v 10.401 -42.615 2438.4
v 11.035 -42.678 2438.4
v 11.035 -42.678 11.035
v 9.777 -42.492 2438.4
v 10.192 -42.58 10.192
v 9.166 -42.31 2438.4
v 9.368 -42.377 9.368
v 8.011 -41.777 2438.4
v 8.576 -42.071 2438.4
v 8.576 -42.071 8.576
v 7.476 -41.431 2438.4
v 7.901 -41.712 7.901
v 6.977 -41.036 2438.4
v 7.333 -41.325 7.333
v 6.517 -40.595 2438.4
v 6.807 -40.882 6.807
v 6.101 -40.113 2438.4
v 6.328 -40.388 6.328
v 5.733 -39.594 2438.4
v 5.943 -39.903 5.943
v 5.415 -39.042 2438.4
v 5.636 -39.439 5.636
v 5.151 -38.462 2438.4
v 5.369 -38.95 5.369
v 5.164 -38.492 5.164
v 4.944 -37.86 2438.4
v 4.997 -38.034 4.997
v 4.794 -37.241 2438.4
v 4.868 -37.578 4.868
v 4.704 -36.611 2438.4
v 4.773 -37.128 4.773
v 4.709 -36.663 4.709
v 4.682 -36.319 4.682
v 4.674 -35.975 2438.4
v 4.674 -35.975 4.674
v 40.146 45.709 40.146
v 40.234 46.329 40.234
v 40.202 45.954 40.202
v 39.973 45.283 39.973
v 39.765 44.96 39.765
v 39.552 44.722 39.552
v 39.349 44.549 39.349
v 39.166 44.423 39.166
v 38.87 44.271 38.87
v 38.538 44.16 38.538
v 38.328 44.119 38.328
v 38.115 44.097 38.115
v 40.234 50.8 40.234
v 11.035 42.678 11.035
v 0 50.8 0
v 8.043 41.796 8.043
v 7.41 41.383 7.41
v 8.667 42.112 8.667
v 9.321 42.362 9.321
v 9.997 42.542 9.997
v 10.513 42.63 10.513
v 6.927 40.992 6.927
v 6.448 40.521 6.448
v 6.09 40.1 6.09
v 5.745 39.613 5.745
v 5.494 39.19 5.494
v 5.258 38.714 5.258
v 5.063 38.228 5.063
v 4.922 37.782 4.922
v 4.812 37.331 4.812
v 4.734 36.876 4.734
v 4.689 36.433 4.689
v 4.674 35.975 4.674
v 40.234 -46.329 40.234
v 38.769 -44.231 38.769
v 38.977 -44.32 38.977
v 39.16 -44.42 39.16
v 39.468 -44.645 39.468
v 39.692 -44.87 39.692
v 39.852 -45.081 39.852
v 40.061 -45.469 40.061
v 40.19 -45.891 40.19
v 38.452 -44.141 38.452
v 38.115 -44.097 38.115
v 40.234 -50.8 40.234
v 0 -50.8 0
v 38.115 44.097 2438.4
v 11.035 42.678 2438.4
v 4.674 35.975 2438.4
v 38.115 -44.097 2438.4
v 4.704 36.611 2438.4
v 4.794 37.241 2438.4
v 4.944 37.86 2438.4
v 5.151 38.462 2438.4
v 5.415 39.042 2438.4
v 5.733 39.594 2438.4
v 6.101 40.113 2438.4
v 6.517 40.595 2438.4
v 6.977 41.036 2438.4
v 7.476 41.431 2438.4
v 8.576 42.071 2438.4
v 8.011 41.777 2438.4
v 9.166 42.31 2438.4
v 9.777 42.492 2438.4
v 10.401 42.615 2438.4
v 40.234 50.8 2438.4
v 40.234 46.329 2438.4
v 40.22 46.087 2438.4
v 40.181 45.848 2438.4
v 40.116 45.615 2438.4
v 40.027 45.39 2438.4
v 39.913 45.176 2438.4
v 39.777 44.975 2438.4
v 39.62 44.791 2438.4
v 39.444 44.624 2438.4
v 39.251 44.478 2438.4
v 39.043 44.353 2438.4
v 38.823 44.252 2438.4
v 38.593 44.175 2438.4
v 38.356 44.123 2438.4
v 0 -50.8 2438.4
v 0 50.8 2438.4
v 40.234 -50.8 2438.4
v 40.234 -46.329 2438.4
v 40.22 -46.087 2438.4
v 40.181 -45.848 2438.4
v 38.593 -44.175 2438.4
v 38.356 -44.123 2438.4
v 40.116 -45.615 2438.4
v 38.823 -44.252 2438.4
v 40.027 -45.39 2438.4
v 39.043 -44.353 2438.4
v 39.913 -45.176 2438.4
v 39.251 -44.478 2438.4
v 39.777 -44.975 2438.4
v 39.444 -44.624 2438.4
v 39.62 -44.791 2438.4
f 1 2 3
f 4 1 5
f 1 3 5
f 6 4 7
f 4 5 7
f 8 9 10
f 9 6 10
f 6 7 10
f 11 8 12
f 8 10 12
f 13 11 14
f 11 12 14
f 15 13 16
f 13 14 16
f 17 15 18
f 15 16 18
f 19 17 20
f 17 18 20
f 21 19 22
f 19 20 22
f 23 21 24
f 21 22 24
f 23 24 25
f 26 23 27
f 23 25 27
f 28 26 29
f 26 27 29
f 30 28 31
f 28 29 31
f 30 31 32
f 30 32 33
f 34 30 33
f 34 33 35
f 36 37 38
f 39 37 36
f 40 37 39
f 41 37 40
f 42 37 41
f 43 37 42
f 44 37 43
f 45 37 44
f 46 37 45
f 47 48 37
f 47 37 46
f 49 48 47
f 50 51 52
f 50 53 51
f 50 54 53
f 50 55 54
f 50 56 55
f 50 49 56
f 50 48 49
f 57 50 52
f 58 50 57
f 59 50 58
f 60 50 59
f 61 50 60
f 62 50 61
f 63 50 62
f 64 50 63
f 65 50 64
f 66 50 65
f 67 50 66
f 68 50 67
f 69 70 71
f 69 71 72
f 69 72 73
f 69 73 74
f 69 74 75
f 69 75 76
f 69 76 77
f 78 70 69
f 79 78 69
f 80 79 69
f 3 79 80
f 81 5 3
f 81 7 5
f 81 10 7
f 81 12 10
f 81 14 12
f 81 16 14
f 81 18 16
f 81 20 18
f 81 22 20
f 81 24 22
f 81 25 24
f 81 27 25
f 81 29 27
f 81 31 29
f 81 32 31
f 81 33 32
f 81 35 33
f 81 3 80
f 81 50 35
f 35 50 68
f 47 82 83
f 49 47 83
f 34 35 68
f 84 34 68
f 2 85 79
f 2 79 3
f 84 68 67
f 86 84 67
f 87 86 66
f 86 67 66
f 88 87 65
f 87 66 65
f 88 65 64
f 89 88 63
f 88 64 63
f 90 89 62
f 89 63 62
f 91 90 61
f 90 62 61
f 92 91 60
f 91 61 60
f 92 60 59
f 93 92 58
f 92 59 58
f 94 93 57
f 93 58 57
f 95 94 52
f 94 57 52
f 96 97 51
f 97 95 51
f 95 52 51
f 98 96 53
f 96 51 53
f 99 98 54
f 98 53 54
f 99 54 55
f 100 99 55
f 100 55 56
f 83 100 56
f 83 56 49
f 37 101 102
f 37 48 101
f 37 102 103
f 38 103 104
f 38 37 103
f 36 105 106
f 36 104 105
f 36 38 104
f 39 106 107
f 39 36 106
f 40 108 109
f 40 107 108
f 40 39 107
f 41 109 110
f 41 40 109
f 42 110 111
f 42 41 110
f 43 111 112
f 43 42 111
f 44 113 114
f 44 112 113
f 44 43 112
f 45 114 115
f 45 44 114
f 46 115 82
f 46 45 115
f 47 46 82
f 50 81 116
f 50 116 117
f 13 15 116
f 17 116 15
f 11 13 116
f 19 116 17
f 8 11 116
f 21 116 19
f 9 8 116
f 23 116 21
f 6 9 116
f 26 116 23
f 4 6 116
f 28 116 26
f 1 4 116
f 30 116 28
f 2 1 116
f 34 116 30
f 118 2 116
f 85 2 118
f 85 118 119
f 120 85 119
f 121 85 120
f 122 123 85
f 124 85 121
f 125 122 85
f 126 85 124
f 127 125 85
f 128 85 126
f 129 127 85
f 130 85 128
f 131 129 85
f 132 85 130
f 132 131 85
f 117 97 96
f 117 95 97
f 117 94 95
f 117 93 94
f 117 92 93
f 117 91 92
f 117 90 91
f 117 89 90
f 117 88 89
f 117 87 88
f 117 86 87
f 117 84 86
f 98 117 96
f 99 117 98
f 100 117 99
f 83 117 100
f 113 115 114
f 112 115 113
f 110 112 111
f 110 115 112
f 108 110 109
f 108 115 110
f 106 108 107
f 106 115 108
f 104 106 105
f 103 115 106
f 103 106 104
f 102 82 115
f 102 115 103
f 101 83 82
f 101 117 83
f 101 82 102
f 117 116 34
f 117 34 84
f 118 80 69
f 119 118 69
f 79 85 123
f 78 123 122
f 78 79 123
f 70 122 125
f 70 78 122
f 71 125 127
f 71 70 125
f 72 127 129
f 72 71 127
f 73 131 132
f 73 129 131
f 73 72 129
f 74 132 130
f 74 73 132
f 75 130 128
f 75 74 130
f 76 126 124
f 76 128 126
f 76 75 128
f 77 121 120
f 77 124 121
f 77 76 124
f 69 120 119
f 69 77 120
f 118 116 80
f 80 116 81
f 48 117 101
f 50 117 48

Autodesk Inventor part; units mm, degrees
ref_plane "Start plane" through (0, 0, 0) normal (0, 0, 1) x (1, 0, 0)
ref_plane "End plane" through (0, 0, 2438.4) normal (0, 0, 1) x (1, 0, 0)
sketch "Sketch" plane through (0, 0, 0) normal (0, 0, 1) x (1, 0, 0)
  line L0 (0, 0) -> (0, 50.8)
  line L1 (0, 50.8) -> (40.2336, 50.8)
  line L2 (40.2336, 50.8) -> (40.2336, 46.3293)
  line L3 (38.1154, 44.0972) -> (11.035, 42.6782)
  line L4 (4.6736, 35.9747) -> (4.6736, 0)
  line L5 (4.6736, 0) -> (0, 0) construction
  line L6 (22.5508, 50.8) -> (22.5508, 43.2816) construction
  line L7 (40.2336, 44.2082) -> (40.2336, 43.2816) construction
  line L8 (40.2336, 43.2816) -> (22.5508, 43.2816) construction
  line L9 (0, 15) -> (0, -27) construction
  line L10 (-5.539, 0) -> (16.0067, 0) construction
  line L11 (0, 0) -> (0, -50.8)
  line L12 (0, -50.8) -> (40.2336, -50.8)
  line L13 (40.2336, -50.8) -> (40.2336, -46.3293)
  line L14 (38.1154, -44.0972) -> (11.035, -42.6782)
  line L15 (4.6736, -35.9747) -> (4.6736, 0)
  arc A0 (11.035, 42.6782) -> (4.6736, 35.9747) centre (11.3862, 35.9747) ccw
  arc A1 (4.6736, -35.9747) -> (11.035, -42.6782) centre (11.3862, -35.9747) ccw
  arc A2 (38.1154, 44.0972) -> (40.2336, 46.3293) centre (37.9984, 46.3293) ccw
  arc A3 (40.2336, -46.3293) -> (38.1154, -44.0972) centre (37.9984, -46.3293) ccw
  line L16 (0, 71.12) -> (0, -71.12) construction
  line L17 (-14.7825, 0) -> (49.9224, 0) construction
  point P0 (4.6736, 42.3448)
  point P1 (40.2336, -44.2082)
  point P2 (4.6736, -42.3448)
  point P3 (22.5508, -50.8)
  point P4 (22.5508, -43.2816)
  dimension "d0" = 4.6736
  dimension "d1" = 50.8
  dimension "d2" = 40.2336
  dimension "d3" = 7.5184
  dimension "d4" = 17.6828
  dimension "d5" = 0.9266
  dimension "d25" = 0
  dimension "d28" = 6.7127
  dimension "d29" = 2.2352
extrude "Body" add sketch "Sketch" along normal up to surface (2438.4 mm away) from surface at 0
sketch "Sketch3" plane through (0, 0, 0) normal (0, 0, 1) x (1, 0, 0)
  line L0 (0, 0) -> (10, 0)
ref_plane "Work Plane3" through (0, 0, 0) normal (0, -1, 0) x (1, 0, 0)
sketch "Sketch4" plane through (0, 0, 0) normal (0, -1, 0) x (1, 0, 0)
  line L0 (-2, 0) -> (12, 0)
  line L1 (-2, 2438.4) -> (12, 2438.4)
  dimension "d31" = 2438.4
ref_plane "Work Plane4" through (0, 0, 0) normal (0.7071, 0, -0.7071) x (-0.7071, 0, -0.7071)
split "Split1" plane through (0, 0, 0) removes the side toward (0.7071, 0, -0.7071)
equation "\"d0\" = G_T"
equation "\"d1\" = 0.5 * G_H"
equation "\"d2\" = G_W"
equation "\"d3\" = G_T1"
equation "\"d4\" = G_C"
equation "\"d28\" = G_IR"
equation "\"d29\" = G_ER"
equation "\"d6\" = G_L"
equation "\"G_W\" = 40.2336"
equation "\"G_H\" = 101.6"
equation "\"G_T\" = 4.6736"
equation "\"G_T1\" = 7.5184"
equation "\"G_NG\" = 0.0524"
equation "\"G_ER\" = 2.2352"
equation "\"G_IR\" = 6.71265"
equation "\"G_C\" = 17.68285"
equation "\"G_L\" = d31"
equation "\"ex\" = 0"
equation "\"G_OFFSET_START\" = 0"
equation "\"G_OFFSET_END\" = 0"
equation "\"d27\" = G_OFFSET_END + B_L"
equation "\"B_L\" = 2438.4"
properties part number "AISC - C 4 x 5.4 - 96" material "Steel, Mild"
